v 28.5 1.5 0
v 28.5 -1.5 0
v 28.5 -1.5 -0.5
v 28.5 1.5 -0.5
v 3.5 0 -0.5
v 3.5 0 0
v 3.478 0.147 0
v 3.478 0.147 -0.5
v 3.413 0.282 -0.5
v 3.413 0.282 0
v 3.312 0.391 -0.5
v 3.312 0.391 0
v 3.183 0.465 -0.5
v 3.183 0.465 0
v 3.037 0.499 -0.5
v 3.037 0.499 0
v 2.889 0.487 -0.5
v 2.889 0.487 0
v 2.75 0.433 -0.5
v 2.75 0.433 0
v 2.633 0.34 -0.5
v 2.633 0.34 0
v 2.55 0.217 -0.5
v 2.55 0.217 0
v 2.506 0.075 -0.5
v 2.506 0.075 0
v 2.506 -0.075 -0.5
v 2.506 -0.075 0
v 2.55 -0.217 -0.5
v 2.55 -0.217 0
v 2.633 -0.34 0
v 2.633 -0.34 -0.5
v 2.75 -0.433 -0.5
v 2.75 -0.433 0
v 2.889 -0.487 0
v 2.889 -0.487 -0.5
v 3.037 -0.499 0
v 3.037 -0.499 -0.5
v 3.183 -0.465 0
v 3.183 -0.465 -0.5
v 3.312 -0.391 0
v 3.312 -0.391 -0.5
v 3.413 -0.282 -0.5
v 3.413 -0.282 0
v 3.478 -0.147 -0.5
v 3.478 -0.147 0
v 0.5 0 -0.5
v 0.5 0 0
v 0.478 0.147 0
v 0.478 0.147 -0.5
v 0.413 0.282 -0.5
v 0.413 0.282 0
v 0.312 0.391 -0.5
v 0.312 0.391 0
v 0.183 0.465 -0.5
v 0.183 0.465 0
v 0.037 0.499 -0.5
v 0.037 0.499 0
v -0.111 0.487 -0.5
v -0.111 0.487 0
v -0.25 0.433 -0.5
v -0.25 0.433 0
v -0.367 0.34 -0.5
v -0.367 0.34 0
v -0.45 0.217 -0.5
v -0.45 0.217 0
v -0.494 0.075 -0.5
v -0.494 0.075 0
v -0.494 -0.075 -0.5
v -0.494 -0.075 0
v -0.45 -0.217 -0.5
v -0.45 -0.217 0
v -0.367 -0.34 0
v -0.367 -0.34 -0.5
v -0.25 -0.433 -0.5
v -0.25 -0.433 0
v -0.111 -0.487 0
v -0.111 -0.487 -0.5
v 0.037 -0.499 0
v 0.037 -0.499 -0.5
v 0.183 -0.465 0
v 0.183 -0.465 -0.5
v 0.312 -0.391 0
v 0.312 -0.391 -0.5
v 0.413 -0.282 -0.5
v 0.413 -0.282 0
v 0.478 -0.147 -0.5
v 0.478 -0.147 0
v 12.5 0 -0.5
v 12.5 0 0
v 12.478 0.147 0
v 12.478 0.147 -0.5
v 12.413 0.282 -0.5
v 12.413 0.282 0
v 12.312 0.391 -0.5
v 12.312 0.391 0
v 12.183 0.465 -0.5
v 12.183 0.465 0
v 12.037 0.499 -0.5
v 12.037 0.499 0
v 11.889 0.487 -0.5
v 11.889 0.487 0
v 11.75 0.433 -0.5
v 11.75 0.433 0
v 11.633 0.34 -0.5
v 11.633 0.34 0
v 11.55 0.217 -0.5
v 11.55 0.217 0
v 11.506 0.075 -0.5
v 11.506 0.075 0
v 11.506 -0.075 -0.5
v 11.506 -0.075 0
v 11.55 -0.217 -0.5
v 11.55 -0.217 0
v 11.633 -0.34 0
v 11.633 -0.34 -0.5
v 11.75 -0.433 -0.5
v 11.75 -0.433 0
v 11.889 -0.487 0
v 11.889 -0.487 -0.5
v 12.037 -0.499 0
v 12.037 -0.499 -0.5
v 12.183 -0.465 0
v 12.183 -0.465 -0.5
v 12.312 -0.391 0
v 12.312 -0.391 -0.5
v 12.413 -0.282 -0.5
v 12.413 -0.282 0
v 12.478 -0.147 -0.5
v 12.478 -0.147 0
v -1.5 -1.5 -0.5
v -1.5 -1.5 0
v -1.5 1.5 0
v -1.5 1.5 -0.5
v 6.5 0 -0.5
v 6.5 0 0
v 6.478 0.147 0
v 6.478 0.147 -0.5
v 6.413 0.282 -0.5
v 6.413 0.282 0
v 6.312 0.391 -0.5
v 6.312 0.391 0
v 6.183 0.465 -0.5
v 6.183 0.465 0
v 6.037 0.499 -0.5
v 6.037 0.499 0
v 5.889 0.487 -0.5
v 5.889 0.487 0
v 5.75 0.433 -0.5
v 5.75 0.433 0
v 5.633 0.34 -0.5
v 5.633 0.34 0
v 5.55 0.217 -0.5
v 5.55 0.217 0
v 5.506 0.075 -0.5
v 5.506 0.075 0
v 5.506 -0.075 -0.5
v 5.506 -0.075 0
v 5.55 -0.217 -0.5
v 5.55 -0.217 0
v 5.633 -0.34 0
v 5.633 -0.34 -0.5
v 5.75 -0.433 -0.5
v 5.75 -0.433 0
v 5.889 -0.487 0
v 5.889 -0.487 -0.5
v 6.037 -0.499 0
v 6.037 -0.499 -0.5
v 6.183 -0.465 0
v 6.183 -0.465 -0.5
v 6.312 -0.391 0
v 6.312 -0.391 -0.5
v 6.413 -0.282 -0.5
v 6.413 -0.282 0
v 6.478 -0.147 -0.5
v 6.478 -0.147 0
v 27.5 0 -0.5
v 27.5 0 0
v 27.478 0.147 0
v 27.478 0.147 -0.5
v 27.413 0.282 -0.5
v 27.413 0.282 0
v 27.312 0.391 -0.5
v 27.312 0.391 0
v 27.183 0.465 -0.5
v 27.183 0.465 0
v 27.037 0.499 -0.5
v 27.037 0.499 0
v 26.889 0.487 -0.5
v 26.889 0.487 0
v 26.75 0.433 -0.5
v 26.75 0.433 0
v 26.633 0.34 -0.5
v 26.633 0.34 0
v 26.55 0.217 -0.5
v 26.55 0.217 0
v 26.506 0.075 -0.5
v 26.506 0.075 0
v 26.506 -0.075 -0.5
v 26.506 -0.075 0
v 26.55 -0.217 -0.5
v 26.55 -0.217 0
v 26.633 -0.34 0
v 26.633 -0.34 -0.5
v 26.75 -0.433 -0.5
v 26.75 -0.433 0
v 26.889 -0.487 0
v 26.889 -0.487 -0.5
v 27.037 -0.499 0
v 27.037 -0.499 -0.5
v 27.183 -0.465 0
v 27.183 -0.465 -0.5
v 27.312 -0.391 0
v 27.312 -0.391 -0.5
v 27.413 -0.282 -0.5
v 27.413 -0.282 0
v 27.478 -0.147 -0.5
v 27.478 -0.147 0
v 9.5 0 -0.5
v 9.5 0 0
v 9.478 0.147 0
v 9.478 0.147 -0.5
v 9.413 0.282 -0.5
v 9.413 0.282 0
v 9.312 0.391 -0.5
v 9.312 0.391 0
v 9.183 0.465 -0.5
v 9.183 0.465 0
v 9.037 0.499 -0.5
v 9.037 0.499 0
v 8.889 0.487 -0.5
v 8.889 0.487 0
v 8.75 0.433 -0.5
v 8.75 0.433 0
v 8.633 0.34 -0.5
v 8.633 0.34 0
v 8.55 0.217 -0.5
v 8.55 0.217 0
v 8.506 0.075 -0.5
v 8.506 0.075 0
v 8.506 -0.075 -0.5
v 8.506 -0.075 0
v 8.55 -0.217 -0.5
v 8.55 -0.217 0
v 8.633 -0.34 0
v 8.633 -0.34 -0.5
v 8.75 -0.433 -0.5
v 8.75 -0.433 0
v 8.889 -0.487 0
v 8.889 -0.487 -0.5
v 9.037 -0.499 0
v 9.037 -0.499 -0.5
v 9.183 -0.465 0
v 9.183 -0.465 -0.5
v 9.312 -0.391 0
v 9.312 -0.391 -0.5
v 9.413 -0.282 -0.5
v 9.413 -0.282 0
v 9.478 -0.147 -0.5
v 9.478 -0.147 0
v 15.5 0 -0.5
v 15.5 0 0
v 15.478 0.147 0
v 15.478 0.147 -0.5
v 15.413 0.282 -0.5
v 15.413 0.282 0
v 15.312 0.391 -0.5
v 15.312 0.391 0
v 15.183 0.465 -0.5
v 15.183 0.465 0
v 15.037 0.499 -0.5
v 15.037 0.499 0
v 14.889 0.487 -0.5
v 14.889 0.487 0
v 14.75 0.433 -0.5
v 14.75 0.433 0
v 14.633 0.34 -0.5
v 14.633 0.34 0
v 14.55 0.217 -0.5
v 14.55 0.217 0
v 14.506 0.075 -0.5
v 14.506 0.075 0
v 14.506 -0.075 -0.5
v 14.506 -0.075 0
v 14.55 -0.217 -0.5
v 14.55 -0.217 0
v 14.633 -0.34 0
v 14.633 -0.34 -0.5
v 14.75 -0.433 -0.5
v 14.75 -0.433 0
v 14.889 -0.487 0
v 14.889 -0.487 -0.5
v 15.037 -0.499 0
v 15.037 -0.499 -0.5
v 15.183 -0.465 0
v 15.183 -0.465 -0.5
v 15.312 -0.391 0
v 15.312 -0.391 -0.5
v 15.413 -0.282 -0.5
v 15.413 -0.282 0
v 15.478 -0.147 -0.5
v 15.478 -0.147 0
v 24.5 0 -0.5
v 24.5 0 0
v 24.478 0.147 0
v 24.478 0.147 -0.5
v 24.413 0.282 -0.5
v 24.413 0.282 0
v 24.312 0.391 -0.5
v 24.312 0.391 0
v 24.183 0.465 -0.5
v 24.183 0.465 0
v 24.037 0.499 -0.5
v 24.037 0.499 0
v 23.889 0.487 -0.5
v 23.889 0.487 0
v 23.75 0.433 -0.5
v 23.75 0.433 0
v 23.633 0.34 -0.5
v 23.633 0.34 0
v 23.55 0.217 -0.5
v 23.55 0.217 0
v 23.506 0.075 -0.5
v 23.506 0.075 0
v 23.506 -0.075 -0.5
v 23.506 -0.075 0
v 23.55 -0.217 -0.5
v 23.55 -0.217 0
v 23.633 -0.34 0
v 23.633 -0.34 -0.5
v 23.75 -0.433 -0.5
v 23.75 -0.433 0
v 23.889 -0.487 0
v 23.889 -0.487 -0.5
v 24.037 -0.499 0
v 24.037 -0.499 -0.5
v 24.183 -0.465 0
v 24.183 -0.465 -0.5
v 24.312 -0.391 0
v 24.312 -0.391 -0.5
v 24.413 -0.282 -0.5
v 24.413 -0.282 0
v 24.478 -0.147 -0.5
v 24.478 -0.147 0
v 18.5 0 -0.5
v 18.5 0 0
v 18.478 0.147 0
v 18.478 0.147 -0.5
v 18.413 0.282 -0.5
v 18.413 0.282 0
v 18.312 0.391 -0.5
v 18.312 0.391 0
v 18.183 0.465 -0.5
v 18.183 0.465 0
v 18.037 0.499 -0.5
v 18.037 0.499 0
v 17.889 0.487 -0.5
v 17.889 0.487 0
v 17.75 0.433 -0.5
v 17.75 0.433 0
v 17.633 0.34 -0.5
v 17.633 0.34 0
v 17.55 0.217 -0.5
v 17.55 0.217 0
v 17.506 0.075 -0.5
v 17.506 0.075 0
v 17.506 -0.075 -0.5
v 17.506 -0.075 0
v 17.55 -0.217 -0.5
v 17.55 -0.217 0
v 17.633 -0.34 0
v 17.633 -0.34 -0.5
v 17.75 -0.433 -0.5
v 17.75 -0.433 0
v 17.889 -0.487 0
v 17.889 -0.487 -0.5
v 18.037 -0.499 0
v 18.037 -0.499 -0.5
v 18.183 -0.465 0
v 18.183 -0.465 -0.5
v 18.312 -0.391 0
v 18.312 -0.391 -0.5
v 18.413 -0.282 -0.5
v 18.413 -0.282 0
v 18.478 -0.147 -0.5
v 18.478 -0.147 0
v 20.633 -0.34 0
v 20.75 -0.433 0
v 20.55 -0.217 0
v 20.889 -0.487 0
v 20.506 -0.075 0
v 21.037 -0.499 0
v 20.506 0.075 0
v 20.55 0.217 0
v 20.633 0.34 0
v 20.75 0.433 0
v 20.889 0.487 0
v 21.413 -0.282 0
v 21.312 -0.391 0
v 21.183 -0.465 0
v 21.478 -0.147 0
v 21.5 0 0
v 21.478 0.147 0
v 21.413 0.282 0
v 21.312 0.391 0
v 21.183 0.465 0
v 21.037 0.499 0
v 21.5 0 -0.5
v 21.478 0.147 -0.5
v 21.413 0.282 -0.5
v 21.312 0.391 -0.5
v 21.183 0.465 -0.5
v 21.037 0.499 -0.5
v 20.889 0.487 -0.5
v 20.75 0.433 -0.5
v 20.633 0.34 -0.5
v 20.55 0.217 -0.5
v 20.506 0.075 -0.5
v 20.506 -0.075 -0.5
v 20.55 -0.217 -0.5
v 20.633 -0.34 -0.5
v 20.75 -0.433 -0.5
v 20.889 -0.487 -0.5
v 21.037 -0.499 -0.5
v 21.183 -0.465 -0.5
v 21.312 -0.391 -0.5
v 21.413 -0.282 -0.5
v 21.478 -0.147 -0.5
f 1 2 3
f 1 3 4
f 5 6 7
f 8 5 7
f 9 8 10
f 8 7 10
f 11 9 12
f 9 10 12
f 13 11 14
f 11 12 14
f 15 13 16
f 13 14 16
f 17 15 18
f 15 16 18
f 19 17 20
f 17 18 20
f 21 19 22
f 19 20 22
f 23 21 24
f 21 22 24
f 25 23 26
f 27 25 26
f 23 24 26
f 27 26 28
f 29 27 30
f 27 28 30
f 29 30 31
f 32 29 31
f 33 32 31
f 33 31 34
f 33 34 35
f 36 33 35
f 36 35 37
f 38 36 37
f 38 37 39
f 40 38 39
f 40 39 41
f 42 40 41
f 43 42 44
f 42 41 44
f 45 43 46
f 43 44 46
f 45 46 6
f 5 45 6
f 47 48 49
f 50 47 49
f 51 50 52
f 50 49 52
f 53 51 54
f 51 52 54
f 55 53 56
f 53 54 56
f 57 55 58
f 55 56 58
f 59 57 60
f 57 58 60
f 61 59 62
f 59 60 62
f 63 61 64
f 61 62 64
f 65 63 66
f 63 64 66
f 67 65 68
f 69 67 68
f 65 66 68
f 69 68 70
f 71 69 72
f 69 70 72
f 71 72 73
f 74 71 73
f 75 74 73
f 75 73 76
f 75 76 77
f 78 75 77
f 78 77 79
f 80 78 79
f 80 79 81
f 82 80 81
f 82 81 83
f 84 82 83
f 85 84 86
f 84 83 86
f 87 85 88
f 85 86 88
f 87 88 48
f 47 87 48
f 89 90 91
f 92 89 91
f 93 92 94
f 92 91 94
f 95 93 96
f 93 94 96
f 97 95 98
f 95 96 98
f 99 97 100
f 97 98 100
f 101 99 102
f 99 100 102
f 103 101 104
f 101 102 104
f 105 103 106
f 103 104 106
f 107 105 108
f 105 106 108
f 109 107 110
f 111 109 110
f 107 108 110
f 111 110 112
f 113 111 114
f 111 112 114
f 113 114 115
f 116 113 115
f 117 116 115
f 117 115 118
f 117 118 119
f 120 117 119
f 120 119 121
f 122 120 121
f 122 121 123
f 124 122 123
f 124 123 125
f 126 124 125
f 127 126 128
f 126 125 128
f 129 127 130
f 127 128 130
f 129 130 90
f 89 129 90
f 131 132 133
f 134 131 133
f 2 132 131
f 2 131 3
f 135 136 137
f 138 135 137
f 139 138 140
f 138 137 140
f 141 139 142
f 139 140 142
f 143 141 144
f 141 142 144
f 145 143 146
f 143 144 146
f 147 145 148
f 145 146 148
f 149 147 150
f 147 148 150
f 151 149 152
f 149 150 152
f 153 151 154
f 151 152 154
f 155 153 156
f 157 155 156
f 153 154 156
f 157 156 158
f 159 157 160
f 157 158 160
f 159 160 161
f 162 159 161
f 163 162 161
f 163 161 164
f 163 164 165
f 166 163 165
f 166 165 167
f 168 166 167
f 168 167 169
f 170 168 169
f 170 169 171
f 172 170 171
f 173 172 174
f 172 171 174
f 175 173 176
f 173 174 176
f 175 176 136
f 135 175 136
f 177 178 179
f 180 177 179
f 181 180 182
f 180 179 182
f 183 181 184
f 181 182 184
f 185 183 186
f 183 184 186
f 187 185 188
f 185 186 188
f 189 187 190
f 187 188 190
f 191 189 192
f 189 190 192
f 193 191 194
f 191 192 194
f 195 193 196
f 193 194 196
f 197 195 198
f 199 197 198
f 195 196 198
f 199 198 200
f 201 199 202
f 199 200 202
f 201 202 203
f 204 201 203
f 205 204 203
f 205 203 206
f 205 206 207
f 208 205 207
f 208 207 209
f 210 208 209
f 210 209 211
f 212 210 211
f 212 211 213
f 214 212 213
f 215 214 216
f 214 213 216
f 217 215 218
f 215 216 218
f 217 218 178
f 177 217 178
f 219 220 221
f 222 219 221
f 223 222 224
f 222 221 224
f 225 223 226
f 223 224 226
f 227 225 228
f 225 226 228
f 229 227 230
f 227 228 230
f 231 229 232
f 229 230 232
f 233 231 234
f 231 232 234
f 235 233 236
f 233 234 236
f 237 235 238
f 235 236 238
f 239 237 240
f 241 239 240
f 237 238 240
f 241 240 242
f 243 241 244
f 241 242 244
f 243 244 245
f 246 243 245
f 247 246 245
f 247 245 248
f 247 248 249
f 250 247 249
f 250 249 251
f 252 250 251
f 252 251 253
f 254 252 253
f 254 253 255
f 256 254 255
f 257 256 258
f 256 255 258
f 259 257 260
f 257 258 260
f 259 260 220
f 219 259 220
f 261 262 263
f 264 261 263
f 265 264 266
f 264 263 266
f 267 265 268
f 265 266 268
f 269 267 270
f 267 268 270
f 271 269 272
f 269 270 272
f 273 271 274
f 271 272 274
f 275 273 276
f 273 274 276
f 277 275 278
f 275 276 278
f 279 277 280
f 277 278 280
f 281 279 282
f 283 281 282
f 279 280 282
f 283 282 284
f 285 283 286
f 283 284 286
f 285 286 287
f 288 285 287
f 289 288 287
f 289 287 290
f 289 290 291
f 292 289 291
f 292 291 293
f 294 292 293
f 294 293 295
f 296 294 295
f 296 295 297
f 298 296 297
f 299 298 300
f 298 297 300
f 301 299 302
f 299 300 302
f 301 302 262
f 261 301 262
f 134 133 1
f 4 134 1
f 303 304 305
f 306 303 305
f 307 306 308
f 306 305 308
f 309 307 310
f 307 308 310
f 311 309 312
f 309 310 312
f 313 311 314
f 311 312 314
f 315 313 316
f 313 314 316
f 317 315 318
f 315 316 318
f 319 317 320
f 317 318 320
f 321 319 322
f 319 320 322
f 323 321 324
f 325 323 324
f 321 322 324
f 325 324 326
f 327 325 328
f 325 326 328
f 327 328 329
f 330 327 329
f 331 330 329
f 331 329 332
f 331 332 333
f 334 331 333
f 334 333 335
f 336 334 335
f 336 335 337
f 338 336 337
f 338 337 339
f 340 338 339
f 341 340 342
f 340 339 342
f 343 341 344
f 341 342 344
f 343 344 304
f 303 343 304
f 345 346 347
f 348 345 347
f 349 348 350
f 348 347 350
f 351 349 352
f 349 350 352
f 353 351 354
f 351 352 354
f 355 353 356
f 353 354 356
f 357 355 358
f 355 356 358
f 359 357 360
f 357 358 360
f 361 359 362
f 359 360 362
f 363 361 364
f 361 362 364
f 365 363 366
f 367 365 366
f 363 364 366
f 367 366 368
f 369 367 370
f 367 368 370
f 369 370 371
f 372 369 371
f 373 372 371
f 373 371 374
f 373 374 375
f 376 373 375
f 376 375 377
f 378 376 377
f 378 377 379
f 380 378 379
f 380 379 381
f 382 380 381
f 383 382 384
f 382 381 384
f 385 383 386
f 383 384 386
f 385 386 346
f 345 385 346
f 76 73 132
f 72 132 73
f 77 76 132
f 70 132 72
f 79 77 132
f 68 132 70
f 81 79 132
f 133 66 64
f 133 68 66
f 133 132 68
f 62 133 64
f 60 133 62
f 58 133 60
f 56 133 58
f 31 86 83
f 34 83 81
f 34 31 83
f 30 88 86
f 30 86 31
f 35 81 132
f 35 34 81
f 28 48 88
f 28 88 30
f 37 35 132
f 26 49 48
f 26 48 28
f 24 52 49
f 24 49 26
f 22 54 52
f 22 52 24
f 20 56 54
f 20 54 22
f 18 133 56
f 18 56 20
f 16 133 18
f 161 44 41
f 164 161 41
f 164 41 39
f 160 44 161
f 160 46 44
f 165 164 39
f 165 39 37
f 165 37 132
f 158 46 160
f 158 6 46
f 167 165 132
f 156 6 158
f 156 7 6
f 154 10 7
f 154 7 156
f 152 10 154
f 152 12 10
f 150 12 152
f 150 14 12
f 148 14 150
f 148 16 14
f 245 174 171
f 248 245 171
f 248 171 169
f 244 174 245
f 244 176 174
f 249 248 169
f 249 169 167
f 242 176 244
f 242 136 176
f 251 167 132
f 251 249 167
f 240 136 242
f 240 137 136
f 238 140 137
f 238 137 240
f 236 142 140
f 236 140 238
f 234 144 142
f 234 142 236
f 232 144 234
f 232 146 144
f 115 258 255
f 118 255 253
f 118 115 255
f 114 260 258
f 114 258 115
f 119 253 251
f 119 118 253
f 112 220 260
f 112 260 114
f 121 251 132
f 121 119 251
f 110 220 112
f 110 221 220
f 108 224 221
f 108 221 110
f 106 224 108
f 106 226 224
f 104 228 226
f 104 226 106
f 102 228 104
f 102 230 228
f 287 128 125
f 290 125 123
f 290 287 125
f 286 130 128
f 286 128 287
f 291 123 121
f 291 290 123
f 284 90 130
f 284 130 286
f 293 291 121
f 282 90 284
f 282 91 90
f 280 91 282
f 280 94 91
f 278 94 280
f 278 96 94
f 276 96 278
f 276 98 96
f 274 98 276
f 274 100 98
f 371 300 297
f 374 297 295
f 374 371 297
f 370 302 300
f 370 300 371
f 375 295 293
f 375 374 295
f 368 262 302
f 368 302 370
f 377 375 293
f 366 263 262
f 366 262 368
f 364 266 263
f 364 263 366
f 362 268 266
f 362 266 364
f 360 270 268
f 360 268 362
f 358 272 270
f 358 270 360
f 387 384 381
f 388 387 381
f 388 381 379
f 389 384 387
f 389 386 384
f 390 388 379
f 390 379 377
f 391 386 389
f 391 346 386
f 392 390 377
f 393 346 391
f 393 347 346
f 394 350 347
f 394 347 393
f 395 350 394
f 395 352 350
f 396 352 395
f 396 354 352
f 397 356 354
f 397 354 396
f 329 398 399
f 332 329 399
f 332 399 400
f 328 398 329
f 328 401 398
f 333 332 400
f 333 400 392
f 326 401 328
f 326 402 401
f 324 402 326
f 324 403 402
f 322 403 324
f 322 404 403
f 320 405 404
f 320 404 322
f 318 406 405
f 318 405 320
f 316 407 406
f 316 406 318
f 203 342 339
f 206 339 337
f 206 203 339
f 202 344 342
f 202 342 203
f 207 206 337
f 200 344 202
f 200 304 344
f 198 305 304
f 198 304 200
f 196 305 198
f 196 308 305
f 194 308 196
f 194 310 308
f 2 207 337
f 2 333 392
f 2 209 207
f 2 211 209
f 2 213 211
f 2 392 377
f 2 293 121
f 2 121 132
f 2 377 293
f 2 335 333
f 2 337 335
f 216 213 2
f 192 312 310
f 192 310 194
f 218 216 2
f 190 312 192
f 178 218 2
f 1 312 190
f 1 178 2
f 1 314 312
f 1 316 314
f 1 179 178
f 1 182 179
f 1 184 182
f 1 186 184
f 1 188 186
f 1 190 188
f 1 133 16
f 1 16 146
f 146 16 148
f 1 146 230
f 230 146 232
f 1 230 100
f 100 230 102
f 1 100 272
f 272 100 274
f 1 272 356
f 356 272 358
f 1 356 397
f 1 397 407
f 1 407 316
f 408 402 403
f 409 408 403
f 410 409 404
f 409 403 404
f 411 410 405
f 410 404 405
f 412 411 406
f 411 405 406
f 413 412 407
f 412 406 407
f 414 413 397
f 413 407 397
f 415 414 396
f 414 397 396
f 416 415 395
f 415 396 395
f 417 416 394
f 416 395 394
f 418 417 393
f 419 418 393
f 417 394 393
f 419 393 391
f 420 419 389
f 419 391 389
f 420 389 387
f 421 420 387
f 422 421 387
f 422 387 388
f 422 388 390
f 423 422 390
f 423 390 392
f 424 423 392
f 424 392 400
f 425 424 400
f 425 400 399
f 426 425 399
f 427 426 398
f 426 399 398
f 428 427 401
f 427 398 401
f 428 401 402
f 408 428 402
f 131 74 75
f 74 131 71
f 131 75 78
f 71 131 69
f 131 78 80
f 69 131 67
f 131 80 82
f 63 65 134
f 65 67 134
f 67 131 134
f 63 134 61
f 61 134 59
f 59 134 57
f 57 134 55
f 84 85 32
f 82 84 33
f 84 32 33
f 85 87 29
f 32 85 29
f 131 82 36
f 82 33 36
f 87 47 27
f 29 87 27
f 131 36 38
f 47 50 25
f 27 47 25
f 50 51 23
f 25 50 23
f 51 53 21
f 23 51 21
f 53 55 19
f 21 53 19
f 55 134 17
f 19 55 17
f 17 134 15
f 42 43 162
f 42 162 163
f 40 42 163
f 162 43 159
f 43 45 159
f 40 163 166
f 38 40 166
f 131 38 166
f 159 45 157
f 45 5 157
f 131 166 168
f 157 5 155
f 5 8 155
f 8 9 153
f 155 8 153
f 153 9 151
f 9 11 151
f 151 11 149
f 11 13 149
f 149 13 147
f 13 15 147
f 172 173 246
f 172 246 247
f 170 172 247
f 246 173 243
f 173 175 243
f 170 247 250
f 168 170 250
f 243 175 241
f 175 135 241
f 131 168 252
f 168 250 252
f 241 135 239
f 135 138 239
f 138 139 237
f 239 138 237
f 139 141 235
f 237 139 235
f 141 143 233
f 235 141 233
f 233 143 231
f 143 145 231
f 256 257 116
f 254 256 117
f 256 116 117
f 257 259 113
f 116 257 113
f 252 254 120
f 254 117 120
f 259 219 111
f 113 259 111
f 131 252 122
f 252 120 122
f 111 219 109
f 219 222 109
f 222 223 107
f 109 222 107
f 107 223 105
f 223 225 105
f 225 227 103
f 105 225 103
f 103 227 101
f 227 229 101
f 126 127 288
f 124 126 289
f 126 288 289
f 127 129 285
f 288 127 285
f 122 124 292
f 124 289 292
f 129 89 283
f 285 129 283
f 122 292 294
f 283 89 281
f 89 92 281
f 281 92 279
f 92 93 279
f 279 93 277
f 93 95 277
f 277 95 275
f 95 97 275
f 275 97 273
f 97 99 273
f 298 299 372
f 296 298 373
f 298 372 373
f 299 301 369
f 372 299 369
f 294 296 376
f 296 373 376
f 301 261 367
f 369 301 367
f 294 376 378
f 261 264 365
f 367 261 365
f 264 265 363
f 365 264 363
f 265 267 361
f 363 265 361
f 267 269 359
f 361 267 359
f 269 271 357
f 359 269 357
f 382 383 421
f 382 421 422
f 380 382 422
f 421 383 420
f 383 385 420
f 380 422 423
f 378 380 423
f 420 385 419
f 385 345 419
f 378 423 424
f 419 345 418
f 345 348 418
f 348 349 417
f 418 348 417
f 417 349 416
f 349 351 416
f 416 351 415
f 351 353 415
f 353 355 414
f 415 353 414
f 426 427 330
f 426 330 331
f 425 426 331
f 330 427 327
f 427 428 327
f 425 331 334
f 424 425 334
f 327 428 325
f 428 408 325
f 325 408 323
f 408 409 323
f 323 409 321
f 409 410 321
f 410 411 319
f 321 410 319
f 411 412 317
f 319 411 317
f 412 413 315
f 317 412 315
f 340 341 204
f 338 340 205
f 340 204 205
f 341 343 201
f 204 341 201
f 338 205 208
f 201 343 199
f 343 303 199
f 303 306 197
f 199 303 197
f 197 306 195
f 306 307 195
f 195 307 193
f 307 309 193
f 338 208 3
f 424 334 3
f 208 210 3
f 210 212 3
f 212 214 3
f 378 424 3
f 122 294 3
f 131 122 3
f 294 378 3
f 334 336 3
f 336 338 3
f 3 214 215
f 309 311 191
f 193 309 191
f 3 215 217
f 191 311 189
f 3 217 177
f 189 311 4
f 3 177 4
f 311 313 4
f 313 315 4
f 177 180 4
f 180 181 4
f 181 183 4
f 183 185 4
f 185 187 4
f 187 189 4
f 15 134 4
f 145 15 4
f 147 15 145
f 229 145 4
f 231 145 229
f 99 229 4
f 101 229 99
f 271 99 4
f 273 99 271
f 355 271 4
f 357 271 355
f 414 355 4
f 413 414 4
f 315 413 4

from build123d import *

# Parameters (mm, degrees)
SKETCH1_W           = 30
SKETCH1_H           = 3
SKETCH1_R           = 0.5
BOSS_EXTRUDE1_DEPTH = 0.5


with BuildPart() as part:
    # Sketch1 → Boss-Extrude1 (new body)
    with BuildSketch(Plane.XY):
        with Locations((13.5, 0)):
            Rectangle(SKETCH1_W, SKETCH1_H)
        Circle(SKETCH1_R, mode=Mode.SUBTRACT)
        with Locations((3, 0)):
            Circle(SKETCH1_R, mode=Mode.SUBTRACT)
        with Locations((6, 0)):
            Circle(SKETCH1_R, mode=Mode.SUBTRACT)
        with Locations((9, 0)):
            Circle(SKETCH1_R, mode=Mode.SUBTRACT)
        with Locations((12, 0)):
            Circle(SKETCH1_R, mode=Mode.SUBTRACT)
        with Locations((15, 0)):
            Circle(SKETCH1_R, mode=Mode.SUBTRACT)
        with Locations((18, 0)):
            Circle(SKETCH1_R, mode=Mode.SUBTRACT)
        with Locations((21, 0)):
            Circle(SKETCH1_R, mode=Mode.SUBTRACT)
        with Locations((24, 0)):
            Circle(SKETCH1_R, mode=Mode.SUBTRACT)
        with Locations((27, 0)):
            Circle(SKETCH1_R, mode=Mode.SUBTRACT)
    extrude(amount=-BOSS_EXTRUDE1_DEPTH)


solid = part.part
